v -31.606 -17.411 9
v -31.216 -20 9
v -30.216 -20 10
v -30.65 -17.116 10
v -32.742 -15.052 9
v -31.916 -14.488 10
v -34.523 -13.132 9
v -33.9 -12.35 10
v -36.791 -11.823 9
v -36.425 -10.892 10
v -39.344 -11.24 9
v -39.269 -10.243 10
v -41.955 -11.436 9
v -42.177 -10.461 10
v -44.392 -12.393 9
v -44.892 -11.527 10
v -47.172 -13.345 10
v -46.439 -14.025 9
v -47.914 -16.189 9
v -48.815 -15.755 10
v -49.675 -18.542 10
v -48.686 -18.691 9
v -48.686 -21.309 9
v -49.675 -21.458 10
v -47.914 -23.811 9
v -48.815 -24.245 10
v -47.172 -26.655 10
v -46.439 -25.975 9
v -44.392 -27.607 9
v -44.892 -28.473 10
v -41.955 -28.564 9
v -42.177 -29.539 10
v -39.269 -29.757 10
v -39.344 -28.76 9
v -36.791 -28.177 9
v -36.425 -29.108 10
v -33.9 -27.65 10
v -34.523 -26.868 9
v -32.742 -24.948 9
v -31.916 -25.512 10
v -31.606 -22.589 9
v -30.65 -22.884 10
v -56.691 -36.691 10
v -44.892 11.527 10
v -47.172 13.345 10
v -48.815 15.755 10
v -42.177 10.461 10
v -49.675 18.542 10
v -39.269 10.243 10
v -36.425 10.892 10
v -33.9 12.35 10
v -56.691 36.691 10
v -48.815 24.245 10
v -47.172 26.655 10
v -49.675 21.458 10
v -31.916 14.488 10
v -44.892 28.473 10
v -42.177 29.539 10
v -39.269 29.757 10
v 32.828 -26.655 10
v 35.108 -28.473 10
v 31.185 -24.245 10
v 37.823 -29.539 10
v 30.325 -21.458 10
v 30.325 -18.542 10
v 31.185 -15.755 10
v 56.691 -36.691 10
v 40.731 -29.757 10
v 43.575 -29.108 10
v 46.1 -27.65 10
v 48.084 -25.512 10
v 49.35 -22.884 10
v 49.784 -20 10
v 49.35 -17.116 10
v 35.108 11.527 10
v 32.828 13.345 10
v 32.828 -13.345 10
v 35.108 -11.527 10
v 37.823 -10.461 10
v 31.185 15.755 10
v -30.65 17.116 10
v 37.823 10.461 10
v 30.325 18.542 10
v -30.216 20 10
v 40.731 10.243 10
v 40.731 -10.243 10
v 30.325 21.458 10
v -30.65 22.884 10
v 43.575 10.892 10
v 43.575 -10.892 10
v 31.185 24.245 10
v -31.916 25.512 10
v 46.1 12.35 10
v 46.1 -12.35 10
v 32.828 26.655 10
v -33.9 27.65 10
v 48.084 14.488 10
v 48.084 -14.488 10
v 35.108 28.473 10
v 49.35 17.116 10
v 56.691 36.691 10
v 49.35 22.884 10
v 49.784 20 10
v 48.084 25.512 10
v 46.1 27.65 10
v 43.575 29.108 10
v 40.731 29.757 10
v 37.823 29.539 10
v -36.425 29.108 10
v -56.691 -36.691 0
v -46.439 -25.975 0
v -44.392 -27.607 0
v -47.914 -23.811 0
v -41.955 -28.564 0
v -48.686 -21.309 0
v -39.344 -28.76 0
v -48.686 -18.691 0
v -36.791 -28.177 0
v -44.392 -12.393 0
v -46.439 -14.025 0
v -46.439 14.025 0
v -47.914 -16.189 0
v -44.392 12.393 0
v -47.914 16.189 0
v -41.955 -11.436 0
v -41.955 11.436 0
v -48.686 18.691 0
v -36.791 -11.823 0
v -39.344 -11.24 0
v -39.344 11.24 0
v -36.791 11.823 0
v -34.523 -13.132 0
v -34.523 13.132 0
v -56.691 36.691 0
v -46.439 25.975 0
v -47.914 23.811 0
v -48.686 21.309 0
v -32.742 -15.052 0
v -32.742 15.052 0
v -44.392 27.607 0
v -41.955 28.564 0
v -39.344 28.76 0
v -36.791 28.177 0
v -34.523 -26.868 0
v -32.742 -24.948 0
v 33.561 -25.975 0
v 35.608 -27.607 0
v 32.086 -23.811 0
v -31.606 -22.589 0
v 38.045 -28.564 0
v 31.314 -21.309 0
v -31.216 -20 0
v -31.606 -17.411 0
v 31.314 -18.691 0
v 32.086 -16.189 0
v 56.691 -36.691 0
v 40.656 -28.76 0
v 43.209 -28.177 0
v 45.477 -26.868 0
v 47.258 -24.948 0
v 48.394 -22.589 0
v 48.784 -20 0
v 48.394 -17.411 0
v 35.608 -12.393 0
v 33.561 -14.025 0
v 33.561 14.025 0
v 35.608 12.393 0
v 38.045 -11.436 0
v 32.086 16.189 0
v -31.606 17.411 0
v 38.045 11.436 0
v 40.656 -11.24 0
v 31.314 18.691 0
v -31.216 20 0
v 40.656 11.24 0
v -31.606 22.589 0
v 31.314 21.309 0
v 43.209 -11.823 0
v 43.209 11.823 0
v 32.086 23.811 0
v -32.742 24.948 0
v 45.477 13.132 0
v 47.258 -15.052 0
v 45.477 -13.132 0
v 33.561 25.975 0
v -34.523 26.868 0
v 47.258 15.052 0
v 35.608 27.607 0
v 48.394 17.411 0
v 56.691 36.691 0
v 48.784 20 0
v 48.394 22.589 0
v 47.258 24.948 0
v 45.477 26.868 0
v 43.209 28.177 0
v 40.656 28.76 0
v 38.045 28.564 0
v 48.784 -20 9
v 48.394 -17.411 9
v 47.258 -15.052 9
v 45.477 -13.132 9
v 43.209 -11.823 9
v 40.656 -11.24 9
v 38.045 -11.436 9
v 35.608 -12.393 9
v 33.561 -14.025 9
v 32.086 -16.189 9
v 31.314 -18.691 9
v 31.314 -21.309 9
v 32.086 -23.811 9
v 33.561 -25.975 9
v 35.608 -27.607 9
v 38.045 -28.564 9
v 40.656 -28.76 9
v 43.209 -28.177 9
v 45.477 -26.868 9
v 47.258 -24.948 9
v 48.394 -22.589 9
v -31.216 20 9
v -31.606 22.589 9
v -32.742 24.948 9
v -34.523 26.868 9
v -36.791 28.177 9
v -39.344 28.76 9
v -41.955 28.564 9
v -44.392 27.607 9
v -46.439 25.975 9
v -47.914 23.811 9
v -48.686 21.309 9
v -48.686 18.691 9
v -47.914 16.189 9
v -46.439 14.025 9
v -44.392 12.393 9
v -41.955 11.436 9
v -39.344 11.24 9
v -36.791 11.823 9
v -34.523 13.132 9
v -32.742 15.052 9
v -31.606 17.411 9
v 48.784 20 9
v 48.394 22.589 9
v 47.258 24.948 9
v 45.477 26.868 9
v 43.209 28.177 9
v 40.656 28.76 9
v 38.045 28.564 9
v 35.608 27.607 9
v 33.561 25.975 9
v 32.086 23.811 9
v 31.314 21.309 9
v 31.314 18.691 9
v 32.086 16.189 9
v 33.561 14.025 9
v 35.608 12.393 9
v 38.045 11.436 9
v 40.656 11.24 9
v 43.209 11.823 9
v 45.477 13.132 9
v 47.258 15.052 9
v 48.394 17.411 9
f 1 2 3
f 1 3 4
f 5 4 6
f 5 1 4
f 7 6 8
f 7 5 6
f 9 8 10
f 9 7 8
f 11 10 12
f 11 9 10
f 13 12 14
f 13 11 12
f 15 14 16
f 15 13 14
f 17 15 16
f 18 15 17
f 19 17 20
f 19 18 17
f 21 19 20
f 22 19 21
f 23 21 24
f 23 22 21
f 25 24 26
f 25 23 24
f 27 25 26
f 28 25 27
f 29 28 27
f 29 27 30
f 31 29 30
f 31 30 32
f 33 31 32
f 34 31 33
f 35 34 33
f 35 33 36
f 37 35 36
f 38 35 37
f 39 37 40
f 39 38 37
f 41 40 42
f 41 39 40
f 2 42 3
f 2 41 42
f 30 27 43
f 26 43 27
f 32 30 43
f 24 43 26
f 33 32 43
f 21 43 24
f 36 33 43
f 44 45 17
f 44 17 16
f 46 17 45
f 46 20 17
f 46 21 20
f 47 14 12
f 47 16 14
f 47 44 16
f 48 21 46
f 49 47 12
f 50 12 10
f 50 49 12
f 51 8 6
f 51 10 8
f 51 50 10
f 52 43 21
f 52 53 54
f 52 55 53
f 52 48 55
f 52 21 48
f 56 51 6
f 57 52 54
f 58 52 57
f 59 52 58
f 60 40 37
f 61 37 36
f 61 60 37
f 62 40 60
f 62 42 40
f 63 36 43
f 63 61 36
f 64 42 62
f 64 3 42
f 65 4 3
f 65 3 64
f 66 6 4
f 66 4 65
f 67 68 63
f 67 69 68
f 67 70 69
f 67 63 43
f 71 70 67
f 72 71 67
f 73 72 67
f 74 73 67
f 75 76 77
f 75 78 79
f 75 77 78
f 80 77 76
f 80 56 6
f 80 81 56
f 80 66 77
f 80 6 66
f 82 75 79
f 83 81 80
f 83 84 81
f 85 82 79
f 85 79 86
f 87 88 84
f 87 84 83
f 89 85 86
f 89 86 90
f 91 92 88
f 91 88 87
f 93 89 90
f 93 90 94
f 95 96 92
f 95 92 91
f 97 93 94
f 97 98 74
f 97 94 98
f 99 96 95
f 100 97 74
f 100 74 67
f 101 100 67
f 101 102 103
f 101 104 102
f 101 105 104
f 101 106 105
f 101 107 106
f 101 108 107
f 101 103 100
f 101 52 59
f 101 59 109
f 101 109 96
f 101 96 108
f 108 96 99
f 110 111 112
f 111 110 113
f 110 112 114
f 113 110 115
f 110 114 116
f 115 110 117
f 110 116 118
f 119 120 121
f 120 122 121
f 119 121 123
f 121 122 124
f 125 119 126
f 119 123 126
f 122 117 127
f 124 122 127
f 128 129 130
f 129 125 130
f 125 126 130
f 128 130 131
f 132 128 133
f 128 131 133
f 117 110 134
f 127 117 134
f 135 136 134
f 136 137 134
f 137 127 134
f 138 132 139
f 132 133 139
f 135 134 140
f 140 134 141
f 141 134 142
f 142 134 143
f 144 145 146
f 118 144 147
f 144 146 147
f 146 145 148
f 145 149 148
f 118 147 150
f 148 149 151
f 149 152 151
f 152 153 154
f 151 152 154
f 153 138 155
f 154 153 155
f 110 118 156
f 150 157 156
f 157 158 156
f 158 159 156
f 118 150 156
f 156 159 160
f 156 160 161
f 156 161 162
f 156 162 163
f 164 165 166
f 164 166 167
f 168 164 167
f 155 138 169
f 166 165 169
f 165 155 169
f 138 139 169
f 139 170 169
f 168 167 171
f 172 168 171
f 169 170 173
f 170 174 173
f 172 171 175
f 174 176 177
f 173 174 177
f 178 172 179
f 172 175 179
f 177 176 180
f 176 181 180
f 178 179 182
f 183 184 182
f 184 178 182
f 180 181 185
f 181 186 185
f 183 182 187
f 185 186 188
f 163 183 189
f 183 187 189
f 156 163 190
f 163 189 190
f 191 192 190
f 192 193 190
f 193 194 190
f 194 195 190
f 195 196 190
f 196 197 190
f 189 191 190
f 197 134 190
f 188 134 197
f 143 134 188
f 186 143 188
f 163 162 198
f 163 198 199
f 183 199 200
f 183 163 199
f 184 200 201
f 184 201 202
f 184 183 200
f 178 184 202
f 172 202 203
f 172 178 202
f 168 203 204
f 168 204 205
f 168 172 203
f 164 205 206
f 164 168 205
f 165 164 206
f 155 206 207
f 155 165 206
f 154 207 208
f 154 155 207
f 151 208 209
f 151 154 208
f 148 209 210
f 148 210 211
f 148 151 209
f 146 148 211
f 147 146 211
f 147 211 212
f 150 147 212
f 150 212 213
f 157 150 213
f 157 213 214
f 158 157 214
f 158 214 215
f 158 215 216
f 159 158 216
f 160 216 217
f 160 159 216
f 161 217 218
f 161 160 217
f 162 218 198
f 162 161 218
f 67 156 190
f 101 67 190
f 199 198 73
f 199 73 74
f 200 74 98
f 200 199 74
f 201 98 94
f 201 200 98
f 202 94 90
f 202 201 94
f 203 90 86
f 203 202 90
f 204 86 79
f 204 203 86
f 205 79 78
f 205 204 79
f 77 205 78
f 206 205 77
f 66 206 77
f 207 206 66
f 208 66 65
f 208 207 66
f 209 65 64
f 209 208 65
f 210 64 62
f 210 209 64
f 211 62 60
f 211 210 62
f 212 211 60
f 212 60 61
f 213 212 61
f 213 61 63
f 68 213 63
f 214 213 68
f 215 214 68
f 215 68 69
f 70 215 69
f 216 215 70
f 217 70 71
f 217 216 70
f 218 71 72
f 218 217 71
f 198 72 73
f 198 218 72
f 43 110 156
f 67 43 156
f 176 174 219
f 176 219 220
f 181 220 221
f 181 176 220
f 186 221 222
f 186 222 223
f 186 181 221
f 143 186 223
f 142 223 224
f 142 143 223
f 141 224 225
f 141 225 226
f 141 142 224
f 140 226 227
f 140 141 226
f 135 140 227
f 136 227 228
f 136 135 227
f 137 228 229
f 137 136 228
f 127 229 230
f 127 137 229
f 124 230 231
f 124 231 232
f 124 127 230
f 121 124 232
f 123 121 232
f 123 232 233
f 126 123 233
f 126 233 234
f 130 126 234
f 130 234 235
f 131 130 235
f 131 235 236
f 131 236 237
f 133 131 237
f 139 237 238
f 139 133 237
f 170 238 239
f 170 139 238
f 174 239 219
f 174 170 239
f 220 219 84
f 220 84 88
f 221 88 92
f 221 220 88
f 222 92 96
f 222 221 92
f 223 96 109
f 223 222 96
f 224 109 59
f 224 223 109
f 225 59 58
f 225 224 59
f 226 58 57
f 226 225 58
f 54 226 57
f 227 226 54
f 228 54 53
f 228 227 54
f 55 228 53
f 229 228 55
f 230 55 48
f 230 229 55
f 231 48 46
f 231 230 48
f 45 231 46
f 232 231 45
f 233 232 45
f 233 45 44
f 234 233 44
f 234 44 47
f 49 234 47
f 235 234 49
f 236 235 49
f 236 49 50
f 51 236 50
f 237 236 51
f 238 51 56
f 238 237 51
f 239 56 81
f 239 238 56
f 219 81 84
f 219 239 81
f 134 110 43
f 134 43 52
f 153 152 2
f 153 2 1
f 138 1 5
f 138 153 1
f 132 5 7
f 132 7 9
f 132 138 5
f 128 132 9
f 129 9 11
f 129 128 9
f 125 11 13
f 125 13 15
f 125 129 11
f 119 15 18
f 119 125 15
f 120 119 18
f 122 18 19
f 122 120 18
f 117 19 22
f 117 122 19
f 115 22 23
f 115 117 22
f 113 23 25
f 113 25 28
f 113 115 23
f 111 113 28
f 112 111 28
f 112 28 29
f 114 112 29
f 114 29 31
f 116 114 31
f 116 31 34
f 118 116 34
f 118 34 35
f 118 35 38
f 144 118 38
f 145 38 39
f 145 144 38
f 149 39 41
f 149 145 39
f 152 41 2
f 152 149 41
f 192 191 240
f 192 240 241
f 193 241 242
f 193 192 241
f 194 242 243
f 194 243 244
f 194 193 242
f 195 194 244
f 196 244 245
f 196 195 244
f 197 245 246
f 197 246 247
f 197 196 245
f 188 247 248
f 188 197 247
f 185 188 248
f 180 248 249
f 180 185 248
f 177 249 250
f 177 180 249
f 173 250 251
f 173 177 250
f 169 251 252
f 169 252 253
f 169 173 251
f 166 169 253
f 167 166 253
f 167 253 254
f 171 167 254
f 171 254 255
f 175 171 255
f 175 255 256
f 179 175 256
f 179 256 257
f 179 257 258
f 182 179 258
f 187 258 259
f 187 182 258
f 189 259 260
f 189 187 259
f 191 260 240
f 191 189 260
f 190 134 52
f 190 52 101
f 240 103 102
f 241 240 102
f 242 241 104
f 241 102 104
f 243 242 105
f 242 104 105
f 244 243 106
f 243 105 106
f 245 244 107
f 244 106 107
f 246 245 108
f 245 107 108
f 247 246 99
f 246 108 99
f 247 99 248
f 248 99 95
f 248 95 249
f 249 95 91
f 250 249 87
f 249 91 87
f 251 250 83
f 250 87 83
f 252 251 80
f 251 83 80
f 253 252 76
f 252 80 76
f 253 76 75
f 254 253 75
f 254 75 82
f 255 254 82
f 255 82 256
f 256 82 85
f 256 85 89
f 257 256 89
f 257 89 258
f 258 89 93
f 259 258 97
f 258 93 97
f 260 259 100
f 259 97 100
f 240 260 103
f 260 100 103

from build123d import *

# Parameters (mm, degrees)
SKETCH_W        = 113.3828
SKETCH_H        = 73.3828
SKETCH_R        = 8.784219
PAD_DEPTH       = 10
CHAMFER_SIZE    = 1
CHAMFER001_SIZE = 1
CHAMFER002_SIZE = 1
CHAMFER003_SIZE = 1


with BuildPart() as part:
    # Sketch → Pad (new body)
    with BuildSketch(Plane.XY):
        Rectangle(SKETCH_W, SKETCH_H)
        with Locations((-40, 20)):
            Circle(SKETCH_R, mode=Mode.SUBTRACT)
        with Locations((-40, -20)):
            Circle(SKETCH_R, mode=Mode.SUBTRACT)
        with Locations((40, -20)):
            Circle(SKETCH_R, mode=Mode.SUBTRACT)
        with Locations((40, 20)):
            Circle(SKETCH_R, mode=Mode.SUBTRACT)
    extrude(amount=PAD_DEPTH)

    # Chamfer
    chamfer_edges = [part.edges().sort_by_distance(p)[0] for p in [
        (31.215781, 20, 10),
    ]]
    chamfer(chamfer_edges, length=CHAMFER_SIZE)

    # Chamfer001
    chamfer001_edges = [part.edges().sort_by_distance(p)[0] for p in [
        (31.215781, -20, 10),
    ]]
    chamfer(chamfer001_edges, length=CHAMFER001_SIZE)

    # Chamfer002
    chamfer002_edges = [part.edges().sort_by_distance(p)[0] for p in [
        (-48.784219, 20, 10),
    ]]
    chamfer(chamfer002_edges, length=CHAMFER002_SIZE)

    # Chamfer003
    chamfer003_edges = [part.edges().sort_by_distance(p)[0] for p in [
        (-48.784219, -20, 10),
    ]]
    chamfer(chamfer003_edges, length=CHAMFER003_SIZE)


solid = part.part
